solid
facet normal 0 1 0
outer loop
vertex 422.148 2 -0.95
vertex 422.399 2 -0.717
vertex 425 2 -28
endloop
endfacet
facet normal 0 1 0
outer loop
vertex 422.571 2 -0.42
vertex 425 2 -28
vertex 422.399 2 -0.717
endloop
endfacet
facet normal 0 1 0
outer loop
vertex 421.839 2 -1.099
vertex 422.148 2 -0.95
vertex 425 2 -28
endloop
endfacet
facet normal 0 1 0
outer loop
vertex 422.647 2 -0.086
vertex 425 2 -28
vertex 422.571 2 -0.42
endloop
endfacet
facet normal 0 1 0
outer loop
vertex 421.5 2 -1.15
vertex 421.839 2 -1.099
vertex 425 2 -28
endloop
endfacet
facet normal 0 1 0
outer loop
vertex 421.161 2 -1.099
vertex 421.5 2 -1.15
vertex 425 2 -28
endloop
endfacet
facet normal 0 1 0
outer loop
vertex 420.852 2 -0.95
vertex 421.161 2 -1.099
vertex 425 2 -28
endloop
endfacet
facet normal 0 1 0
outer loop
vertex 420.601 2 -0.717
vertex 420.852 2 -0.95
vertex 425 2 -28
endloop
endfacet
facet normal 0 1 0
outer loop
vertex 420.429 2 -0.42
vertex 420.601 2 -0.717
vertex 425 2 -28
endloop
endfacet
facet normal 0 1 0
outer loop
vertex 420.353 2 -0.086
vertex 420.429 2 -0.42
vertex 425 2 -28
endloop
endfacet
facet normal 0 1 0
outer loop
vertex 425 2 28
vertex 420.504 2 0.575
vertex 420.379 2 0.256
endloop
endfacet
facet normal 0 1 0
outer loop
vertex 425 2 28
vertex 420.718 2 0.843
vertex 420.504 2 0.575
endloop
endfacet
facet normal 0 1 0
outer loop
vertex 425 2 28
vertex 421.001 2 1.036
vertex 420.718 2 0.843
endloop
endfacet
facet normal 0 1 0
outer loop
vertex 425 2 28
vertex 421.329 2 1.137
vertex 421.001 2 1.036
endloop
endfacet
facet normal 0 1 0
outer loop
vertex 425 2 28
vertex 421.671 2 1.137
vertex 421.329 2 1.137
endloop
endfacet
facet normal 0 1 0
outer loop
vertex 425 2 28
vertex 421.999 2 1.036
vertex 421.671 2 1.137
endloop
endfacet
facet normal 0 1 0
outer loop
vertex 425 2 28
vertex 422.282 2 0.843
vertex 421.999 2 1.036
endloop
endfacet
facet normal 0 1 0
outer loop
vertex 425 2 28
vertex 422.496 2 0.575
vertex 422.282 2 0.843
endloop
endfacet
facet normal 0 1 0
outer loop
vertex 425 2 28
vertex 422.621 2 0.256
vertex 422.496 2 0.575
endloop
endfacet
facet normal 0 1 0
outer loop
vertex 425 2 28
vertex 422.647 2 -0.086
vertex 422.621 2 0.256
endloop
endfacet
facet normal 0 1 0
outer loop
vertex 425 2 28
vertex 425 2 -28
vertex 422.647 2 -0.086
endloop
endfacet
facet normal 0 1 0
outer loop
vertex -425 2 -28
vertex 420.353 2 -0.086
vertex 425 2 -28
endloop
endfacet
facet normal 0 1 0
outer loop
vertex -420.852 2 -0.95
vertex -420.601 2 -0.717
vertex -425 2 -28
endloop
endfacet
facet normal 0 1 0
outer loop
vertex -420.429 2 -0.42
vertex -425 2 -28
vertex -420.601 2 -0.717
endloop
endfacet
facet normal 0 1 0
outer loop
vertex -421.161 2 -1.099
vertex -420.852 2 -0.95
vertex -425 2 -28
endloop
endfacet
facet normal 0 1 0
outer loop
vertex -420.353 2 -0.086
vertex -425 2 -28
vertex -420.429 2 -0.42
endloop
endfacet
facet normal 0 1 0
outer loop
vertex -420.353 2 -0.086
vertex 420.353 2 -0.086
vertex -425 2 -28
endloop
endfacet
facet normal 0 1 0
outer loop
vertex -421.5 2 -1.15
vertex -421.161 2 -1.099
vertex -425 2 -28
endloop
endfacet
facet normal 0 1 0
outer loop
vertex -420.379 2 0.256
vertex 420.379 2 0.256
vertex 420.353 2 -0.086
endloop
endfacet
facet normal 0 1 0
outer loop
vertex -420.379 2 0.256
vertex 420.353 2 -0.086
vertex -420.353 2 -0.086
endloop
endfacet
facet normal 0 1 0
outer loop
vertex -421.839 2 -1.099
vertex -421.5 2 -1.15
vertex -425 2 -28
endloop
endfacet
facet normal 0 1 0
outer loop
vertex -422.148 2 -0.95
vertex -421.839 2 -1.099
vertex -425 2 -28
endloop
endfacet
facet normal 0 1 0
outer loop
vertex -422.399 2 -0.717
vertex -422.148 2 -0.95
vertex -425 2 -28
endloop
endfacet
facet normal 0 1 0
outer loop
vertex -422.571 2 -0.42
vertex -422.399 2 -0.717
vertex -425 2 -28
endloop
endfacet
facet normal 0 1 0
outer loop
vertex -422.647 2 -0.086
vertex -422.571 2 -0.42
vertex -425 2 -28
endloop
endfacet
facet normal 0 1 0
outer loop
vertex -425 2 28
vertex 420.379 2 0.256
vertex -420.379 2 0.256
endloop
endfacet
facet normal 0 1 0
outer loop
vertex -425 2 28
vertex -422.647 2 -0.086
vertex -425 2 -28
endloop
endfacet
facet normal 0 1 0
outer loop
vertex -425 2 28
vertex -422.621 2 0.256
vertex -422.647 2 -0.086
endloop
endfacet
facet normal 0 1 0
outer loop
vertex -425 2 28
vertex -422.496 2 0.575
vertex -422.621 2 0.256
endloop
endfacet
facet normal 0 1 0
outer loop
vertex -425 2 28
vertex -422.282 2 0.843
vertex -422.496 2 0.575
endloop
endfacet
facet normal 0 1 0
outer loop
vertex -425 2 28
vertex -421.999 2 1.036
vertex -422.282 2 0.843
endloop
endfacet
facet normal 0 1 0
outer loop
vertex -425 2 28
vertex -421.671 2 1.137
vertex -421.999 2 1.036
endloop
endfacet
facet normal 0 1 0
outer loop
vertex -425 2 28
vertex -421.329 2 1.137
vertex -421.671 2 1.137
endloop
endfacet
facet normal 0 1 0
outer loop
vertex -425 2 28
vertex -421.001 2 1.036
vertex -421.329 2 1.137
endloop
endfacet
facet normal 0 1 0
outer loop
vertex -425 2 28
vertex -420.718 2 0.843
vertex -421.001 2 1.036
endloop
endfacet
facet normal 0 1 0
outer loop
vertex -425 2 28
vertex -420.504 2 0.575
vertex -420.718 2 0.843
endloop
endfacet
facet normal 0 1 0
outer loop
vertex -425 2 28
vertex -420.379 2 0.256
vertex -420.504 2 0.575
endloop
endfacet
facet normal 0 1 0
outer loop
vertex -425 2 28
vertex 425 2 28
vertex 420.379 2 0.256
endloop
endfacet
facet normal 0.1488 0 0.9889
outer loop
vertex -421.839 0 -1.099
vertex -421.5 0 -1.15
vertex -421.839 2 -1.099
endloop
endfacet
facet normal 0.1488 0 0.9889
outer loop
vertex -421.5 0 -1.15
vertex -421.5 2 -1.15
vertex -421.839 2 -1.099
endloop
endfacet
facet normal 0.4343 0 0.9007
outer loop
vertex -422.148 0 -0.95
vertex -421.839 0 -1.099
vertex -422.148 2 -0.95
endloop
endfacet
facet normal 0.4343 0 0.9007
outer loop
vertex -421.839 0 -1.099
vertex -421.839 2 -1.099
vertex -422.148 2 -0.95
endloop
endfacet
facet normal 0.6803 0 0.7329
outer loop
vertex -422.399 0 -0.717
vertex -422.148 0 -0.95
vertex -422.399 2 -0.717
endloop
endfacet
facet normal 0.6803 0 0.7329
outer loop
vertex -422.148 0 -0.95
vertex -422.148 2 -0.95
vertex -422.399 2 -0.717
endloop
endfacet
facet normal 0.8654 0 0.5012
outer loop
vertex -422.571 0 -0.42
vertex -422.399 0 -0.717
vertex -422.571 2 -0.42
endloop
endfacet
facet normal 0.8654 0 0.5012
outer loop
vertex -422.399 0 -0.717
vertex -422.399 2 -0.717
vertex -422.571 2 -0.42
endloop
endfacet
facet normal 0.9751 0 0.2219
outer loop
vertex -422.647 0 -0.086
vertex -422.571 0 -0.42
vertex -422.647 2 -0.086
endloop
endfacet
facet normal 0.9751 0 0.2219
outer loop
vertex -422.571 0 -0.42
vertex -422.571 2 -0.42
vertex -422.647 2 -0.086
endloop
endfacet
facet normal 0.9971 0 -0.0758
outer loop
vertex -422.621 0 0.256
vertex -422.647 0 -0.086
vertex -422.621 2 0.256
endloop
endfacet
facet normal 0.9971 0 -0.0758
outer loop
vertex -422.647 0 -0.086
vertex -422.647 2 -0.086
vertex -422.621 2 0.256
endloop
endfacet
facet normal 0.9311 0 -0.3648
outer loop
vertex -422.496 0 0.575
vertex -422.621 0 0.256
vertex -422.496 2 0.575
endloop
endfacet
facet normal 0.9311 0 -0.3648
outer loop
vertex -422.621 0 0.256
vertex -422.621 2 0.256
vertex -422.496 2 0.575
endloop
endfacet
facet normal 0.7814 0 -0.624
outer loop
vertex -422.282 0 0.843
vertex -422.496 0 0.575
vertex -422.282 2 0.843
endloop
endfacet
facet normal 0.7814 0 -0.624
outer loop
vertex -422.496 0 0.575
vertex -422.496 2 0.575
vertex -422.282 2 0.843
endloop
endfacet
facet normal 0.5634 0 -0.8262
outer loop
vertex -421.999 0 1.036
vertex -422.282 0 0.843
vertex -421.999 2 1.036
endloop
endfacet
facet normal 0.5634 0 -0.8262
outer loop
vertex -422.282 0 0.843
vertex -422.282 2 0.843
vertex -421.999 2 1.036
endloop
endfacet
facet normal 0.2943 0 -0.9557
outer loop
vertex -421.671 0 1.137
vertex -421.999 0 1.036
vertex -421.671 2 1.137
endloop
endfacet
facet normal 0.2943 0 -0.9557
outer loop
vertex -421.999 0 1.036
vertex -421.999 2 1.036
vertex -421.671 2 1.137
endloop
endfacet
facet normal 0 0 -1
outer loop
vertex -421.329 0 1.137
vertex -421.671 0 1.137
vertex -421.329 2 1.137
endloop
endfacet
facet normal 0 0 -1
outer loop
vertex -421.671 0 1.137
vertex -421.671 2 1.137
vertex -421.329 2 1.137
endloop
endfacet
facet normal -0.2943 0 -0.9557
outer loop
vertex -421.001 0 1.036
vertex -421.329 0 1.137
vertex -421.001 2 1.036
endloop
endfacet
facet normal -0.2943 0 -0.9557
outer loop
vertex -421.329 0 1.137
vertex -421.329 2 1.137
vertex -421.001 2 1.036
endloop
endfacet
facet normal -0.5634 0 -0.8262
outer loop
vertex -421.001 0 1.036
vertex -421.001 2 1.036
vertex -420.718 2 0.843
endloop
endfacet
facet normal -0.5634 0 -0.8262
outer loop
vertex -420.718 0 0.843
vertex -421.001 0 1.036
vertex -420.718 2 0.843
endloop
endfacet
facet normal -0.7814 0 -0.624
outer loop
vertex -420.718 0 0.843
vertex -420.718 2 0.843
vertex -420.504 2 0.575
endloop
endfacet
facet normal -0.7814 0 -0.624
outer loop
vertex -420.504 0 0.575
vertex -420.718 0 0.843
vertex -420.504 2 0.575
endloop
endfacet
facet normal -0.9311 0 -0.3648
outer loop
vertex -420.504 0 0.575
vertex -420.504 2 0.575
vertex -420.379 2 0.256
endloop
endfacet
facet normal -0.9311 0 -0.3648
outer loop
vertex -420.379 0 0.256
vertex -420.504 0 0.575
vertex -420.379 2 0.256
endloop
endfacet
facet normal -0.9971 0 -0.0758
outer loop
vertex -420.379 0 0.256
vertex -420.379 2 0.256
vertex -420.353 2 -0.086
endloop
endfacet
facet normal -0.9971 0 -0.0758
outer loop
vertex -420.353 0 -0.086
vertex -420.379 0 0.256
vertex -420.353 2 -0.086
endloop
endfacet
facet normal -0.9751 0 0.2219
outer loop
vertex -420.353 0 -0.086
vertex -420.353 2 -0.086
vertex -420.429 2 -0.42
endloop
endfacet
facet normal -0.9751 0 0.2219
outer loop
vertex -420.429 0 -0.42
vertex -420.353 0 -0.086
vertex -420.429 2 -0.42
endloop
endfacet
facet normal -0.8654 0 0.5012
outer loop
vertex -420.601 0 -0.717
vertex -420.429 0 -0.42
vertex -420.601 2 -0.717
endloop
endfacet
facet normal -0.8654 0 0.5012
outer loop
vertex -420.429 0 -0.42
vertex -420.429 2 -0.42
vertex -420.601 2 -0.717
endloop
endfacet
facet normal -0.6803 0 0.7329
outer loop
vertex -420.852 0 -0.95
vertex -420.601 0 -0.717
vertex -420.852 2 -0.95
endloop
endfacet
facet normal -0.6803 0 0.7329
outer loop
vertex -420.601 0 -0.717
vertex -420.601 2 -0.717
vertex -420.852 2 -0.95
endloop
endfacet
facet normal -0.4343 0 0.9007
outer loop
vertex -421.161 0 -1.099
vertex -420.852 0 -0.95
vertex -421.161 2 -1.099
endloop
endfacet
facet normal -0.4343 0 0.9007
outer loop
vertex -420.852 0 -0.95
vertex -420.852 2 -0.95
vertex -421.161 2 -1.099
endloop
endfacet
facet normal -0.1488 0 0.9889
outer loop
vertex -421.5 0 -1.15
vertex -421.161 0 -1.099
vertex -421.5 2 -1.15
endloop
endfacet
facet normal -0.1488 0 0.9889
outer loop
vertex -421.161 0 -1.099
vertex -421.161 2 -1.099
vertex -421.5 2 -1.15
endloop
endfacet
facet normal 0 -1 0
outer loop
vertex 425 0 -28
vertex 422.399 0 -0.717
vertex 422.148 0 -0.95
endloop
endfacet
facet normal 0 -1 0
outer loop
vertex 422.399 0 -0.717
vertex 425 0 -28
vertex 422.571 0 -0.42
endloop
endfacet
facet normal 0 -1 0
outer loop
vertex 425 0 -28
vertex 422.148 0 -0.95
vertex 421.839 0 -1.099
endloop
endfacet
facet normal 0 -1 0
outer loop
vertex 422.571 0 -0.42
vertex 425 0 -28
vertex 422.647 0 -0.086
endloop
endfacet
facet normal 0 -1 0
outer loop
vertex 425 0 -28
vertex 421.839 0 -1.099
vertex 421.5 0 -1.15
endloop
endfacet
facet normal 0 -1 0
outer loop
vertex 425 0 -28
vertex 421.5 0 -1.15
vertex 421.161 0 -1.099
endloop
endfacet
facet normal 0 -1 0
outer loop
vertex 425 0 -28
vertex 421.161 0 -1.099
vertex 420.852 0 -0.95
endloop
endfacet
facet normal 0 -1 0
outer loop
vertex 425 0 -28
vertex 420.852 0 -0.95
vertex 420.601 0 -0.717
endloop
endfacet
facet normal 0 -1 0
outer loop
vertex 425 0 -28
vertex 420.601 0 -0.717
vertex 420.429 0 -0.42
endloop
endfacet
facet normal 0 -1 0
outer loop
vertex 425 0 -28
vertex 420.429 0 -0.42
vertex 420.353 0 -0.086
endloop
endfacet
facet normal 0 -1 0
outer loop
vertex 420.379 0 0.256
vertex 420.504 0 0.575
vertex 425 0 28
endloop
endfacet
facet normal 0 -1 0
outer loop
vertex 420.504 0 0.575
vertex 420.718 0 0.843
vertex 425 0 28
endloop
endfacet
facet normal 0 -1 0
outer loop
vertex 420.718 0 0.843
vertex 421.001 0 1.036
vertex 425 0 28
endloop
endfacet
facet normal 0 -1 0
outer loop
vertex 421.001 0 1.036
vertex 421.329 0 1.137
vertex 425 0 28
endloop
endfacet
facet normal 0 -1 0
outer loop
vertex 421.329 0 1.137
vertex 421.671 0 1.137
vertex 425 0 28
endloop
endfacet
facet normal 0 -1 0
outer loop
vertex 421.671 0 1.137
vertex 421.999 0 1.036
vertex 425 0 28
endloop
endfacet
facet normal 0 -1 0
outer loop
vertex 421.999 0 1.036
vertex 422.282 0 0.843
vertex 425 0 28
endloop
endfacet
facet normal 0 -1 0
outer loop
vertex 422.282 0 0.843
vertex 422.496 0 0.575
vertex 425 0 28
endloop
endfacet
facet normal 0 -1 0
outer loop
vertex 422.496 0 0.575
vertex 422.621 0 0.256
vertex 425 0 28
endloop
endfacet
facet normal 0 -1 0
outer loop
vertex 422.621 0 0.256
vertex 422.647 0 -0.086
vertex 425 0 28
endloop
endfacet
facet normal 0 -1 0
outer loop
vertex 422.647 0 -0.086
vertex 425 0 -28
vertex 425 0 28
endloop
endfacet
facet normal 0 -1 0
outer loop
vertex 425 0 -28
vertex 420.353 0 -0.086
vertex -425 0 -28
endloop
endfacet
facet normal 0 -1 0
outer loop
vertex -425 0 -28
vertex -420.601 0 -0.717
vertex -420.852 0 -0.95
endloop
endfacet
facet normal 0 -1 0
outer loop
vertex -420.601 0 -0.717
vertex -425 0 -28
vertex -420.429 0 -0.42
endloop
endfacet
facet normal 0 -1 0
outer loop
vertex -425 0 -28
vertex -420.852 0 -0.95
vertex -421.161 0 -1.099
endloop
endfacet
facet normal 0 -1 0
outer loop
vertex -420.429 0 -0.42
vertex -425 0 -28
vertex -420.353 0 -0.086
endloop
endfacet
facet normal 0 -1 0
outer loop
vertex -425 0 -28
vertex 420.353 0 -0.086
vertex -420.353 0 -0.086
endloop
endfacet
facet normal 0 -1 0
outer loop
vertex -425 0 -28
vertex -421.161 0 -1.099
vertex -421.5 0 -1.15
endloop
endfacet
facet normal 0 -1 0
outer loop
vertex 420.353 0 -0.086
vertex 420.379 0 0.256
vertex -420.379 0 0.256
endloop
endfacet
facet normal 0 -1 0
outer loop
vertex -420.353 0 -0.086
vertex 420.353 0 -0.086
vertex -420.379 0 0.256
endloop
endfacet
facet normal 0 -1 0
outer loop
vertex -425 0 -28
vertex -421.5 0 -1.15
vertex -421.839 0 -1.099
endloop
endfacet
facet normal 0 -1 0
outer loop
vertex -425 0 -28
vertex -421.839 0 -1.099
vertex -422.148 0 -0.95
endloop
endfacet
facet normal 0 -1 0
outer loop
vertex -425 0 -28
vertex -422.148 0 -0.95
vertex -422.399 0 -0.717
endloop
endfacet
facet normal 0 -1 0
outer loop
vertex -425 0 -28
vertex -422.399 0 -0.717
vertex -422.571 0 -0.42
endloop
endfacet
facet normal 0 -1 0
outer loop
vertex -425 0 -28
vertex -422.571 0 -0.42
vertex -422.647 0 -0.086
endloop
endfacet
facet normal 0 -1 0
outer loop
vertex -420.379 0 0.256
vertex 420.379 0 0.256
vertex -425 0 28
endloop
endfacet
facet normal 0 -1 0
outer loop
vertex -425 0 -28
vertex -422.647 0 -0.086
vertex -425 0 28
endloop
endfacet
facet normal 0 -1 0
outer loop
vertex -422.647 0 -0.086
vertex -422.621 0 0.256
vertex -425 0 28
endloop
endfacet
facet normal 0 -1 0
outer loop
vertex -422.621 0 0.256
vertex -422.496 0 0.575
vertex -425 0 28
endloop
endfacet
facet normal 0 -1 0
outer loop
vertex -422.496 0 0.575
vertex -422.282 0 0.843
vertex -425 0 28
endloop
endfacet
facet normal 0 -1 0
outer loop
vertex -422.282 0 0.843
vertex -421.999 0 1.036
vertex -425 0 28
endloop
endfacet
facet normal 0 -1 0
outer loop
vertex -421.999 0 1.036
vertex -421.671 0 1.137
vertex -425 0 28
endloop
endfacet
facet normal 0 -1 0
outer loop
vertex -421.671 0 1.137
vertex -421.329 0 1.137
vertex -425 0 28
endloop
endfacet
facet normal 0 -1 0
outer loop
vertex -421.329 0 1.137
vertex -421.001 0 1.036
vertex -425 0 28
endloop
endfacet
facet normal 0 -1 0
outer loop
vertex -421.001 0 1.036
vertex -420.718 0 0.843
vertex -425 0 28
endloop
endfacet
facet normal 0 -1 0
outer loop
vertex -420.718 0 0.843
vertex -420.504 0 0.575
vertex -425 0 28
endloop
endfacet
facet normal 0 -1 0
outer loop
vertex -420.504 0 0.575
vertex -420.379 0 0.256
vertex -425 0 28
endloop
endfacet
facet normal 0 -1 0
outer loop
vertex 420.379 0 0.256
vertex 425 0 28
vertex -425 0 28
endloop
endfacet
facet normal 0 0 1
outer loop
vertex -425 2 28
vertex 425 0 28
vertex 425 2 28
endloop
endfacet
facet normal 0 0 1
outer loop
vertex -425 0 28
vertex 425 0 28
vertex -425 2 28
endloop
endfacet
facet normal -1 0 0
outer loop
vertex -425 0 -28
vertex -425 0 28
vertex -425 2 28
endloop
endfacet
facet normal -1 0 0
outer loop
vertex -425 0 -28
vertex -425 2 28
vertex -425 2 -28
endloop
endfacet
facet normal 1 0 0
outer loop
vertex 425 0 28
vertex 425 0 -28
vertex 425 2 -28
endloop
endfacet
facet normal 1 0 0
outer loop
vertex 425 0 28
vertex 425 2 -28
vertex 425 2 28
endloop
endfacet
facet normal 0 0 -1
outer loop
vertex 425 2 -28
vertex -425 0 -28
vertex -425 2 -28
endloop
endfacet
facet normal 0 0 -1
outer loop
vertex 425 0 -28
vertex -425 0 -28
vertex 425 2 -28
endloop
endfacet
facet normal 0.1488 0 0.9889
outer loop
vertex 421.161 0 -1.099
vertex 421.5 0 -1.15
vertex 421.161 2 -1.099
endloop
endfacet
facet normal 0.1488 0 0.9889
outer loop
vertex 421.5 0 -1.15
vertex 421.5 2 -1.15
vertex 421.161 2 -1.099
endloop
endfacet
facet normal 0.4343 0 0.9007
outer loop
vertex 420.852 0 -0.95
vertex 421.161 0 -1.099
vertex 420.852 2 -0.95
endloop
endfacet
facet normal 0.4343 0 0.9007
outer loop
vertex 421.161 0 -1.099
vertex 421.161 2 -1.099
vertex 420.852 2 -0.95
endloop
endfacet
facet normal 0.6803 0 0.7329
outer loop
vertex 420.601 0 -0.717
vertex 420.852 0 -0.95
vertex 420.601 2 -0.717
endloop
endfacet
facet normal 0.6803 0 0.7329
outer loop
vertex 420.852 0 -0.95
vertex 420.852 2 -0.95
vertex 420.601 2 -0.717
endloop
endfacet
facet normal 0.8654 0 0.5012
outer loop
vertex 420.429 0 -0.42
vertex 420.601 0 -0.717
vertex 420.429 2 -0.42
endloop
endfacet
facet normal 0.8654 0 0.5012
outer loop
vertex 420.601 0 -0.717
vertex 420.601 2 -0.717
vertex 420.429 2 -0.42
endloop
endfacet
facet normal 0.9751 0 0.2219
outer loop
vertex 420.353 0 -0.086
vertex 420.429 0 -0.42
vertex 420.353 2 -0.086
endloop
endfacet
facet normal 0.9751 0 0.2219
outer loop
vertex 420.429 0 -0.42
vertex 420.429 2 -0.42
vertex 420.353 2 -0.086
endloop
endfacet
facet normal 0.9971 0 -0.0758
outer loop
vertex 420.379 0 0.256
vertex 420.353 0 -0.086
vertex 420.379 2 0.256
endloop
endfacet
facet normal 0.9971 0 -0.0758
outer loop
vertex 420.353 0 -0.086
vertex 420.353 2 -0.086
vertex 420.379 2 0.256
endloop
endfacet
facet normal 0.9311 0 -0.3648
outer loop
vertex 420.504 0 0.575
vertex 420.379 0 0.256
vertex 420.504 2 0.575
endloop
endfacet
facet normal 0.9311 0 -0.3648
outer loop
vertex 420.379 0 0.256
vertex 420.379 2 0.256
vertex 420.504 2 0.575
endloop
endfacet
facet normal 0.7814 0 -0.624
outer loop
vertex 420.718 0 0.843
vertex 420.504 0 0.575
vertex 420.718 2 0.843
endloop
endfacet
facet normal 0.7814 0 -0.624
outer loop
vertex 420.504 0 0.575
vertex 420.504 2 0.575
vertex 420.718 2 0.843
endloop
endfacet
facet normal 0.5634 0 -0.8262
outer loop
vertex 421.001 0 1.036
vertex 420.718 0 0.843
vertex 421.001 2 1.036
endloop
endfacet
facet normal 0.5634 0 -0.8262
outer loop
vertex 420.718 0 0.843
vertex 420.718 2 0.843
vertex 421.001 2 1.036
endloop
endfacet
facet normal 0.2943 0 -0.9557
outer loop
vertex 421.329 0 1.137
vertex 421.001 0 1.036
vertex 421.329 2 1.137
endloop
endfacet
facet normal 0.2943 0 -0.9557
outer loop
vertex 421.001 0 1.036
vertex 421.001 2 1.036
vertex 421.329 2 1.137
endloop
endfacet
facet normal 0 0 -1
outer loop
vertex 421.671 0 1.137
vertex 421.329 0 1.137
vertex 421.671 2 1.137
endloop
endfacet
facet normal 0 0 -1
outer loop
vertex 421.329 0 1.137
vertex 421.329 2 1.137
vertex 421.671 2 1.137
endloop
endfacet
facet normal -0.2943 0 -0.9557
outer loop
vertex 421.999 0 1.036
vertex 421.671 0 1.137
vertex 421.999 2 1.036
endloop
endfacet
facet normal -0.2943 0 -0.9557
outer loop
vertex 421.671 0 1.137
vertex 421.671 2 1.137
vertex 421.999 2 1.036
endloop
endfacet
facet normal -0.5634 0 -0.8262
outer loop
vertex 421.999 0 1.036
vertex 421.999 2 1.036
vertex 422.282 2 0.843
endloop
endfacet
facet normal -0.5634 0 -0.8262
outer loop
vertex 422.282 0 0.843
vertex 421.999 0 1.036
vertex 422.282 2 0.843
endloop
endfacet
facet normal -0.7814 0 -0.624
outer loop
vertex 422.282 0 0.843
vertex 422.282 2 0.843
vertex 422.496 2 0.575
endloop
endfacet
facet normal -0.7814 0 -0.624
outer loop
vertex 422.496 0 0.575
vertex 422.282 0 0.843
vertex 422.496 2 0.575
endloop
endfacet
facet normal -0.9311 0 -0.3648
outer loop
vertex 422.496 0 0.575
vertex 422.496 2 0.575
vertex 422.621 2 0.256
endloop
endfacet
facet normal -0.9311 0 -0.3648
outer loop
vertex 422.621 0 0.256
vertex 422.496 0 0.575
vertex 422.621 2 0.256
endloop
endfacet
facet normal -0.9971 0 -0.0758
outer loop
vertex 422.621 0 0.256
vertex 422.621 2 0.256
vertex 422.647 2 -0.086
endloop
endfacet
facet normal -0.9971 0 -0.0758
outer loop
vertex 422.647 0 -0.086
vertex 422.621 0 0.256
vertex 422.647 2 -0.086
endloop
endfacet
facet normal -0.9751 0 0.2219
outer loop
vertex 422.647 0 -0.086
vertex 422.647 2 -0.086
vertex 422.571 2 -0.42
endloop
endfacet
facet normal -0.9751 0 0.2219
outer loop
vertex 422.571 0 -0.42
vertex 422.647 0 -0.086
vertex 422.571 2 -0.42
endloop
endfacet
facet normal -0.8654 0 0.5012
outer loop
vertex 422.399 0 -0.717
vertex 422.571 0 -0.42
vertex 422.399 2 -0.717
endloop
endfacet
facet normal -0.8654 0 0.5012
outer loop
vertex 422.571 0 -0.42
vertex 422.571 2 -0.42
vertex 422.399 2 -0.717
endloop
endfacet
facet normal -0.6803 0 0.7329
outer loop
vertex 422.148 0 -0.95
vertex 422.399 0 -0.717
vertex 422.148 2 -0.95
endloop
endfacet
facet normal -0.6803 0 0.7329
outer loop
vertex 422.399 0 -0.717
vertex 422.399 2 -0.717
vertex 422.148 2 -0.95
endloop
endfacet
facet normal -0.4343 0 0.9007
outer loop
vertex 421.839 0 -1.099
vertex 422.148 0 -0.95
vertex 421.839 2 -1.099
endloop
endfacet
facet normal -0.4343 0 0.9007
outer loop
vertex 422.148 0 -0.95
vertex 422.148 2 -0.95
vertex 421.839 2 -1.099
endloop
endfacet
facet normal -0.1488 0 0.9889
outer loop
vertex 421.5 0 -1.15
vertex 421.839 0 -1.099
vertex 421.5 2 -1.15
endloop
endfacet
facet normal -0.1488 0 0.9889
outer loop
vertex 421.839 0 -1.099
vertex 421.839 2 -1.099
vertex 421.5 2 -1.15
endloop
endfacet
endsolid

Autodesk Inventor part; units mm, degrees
ref_plane "YZ Plane" through (0, 0, 0) normal (1, 0, 0) x (0, 1, 0)
ref_plane "XZ Plane" through (0, 0, 0) normal (0, 1, 0) x (-1, 0, 0)
ref_plane "XY Plane" through (0, 0, 0) normal (0, 0, 1) x (1, 0, 0)
sketch "Sketch2" plane through (0, 0, 0) normal (0, 1, 0) x (-1, 0, 0)
  line L0 (-425, 28) -> (425, 28)
  line L1 (425, 28) -> (425, -28)
  line L2 (425, -28) -> (-425, -28)
  line L3 (-425, -28) -> (-425, 28)
  point P0 (0, 0)
  dimension "d0" = 56
  dimension "d1" = 28
  dimension "d2" = 850
  dimension "d3" = 425
extrude "Extrusion1" add sketch "Sketch2" along normal blind 2
sketch "Sketch3" plane through (0, 0, 0) normal (0, -1, 0) x (1, 0, 0)
  circle A0 centre (-421.5, 0) radius 1.15
  line L0 (-425, 28) -> (-425, -28) projected
  point P0 (0, 0)
  dimension "d6" = 2.3
  dimension "d7" = 3.5
hole "Hole1" at (-421.5, 0, 0) direction (0, 1, 0) diameter 2.3 end through all
sketch "Sketch4" plane through (0, 0, 0) normal (0, -1, 0) x (1, 0, 0)
  circle A0 centre (421.5, 0) radius 1.15
  line L0 (425, -28) -> (425, 28) projected
  point P0 (0, 0)
  dimension "d15" = 2.3
  dimension "d16" = 3.5
hole "Hole2" at (421.5, 0, 0) direction (0, 1, 0) diameter 2.3 end through all
equation "\"d1\" = 0.5 * d0"
equation "\"d3\" = 0.5 * d2"
properties part number "rf transmission plate"
